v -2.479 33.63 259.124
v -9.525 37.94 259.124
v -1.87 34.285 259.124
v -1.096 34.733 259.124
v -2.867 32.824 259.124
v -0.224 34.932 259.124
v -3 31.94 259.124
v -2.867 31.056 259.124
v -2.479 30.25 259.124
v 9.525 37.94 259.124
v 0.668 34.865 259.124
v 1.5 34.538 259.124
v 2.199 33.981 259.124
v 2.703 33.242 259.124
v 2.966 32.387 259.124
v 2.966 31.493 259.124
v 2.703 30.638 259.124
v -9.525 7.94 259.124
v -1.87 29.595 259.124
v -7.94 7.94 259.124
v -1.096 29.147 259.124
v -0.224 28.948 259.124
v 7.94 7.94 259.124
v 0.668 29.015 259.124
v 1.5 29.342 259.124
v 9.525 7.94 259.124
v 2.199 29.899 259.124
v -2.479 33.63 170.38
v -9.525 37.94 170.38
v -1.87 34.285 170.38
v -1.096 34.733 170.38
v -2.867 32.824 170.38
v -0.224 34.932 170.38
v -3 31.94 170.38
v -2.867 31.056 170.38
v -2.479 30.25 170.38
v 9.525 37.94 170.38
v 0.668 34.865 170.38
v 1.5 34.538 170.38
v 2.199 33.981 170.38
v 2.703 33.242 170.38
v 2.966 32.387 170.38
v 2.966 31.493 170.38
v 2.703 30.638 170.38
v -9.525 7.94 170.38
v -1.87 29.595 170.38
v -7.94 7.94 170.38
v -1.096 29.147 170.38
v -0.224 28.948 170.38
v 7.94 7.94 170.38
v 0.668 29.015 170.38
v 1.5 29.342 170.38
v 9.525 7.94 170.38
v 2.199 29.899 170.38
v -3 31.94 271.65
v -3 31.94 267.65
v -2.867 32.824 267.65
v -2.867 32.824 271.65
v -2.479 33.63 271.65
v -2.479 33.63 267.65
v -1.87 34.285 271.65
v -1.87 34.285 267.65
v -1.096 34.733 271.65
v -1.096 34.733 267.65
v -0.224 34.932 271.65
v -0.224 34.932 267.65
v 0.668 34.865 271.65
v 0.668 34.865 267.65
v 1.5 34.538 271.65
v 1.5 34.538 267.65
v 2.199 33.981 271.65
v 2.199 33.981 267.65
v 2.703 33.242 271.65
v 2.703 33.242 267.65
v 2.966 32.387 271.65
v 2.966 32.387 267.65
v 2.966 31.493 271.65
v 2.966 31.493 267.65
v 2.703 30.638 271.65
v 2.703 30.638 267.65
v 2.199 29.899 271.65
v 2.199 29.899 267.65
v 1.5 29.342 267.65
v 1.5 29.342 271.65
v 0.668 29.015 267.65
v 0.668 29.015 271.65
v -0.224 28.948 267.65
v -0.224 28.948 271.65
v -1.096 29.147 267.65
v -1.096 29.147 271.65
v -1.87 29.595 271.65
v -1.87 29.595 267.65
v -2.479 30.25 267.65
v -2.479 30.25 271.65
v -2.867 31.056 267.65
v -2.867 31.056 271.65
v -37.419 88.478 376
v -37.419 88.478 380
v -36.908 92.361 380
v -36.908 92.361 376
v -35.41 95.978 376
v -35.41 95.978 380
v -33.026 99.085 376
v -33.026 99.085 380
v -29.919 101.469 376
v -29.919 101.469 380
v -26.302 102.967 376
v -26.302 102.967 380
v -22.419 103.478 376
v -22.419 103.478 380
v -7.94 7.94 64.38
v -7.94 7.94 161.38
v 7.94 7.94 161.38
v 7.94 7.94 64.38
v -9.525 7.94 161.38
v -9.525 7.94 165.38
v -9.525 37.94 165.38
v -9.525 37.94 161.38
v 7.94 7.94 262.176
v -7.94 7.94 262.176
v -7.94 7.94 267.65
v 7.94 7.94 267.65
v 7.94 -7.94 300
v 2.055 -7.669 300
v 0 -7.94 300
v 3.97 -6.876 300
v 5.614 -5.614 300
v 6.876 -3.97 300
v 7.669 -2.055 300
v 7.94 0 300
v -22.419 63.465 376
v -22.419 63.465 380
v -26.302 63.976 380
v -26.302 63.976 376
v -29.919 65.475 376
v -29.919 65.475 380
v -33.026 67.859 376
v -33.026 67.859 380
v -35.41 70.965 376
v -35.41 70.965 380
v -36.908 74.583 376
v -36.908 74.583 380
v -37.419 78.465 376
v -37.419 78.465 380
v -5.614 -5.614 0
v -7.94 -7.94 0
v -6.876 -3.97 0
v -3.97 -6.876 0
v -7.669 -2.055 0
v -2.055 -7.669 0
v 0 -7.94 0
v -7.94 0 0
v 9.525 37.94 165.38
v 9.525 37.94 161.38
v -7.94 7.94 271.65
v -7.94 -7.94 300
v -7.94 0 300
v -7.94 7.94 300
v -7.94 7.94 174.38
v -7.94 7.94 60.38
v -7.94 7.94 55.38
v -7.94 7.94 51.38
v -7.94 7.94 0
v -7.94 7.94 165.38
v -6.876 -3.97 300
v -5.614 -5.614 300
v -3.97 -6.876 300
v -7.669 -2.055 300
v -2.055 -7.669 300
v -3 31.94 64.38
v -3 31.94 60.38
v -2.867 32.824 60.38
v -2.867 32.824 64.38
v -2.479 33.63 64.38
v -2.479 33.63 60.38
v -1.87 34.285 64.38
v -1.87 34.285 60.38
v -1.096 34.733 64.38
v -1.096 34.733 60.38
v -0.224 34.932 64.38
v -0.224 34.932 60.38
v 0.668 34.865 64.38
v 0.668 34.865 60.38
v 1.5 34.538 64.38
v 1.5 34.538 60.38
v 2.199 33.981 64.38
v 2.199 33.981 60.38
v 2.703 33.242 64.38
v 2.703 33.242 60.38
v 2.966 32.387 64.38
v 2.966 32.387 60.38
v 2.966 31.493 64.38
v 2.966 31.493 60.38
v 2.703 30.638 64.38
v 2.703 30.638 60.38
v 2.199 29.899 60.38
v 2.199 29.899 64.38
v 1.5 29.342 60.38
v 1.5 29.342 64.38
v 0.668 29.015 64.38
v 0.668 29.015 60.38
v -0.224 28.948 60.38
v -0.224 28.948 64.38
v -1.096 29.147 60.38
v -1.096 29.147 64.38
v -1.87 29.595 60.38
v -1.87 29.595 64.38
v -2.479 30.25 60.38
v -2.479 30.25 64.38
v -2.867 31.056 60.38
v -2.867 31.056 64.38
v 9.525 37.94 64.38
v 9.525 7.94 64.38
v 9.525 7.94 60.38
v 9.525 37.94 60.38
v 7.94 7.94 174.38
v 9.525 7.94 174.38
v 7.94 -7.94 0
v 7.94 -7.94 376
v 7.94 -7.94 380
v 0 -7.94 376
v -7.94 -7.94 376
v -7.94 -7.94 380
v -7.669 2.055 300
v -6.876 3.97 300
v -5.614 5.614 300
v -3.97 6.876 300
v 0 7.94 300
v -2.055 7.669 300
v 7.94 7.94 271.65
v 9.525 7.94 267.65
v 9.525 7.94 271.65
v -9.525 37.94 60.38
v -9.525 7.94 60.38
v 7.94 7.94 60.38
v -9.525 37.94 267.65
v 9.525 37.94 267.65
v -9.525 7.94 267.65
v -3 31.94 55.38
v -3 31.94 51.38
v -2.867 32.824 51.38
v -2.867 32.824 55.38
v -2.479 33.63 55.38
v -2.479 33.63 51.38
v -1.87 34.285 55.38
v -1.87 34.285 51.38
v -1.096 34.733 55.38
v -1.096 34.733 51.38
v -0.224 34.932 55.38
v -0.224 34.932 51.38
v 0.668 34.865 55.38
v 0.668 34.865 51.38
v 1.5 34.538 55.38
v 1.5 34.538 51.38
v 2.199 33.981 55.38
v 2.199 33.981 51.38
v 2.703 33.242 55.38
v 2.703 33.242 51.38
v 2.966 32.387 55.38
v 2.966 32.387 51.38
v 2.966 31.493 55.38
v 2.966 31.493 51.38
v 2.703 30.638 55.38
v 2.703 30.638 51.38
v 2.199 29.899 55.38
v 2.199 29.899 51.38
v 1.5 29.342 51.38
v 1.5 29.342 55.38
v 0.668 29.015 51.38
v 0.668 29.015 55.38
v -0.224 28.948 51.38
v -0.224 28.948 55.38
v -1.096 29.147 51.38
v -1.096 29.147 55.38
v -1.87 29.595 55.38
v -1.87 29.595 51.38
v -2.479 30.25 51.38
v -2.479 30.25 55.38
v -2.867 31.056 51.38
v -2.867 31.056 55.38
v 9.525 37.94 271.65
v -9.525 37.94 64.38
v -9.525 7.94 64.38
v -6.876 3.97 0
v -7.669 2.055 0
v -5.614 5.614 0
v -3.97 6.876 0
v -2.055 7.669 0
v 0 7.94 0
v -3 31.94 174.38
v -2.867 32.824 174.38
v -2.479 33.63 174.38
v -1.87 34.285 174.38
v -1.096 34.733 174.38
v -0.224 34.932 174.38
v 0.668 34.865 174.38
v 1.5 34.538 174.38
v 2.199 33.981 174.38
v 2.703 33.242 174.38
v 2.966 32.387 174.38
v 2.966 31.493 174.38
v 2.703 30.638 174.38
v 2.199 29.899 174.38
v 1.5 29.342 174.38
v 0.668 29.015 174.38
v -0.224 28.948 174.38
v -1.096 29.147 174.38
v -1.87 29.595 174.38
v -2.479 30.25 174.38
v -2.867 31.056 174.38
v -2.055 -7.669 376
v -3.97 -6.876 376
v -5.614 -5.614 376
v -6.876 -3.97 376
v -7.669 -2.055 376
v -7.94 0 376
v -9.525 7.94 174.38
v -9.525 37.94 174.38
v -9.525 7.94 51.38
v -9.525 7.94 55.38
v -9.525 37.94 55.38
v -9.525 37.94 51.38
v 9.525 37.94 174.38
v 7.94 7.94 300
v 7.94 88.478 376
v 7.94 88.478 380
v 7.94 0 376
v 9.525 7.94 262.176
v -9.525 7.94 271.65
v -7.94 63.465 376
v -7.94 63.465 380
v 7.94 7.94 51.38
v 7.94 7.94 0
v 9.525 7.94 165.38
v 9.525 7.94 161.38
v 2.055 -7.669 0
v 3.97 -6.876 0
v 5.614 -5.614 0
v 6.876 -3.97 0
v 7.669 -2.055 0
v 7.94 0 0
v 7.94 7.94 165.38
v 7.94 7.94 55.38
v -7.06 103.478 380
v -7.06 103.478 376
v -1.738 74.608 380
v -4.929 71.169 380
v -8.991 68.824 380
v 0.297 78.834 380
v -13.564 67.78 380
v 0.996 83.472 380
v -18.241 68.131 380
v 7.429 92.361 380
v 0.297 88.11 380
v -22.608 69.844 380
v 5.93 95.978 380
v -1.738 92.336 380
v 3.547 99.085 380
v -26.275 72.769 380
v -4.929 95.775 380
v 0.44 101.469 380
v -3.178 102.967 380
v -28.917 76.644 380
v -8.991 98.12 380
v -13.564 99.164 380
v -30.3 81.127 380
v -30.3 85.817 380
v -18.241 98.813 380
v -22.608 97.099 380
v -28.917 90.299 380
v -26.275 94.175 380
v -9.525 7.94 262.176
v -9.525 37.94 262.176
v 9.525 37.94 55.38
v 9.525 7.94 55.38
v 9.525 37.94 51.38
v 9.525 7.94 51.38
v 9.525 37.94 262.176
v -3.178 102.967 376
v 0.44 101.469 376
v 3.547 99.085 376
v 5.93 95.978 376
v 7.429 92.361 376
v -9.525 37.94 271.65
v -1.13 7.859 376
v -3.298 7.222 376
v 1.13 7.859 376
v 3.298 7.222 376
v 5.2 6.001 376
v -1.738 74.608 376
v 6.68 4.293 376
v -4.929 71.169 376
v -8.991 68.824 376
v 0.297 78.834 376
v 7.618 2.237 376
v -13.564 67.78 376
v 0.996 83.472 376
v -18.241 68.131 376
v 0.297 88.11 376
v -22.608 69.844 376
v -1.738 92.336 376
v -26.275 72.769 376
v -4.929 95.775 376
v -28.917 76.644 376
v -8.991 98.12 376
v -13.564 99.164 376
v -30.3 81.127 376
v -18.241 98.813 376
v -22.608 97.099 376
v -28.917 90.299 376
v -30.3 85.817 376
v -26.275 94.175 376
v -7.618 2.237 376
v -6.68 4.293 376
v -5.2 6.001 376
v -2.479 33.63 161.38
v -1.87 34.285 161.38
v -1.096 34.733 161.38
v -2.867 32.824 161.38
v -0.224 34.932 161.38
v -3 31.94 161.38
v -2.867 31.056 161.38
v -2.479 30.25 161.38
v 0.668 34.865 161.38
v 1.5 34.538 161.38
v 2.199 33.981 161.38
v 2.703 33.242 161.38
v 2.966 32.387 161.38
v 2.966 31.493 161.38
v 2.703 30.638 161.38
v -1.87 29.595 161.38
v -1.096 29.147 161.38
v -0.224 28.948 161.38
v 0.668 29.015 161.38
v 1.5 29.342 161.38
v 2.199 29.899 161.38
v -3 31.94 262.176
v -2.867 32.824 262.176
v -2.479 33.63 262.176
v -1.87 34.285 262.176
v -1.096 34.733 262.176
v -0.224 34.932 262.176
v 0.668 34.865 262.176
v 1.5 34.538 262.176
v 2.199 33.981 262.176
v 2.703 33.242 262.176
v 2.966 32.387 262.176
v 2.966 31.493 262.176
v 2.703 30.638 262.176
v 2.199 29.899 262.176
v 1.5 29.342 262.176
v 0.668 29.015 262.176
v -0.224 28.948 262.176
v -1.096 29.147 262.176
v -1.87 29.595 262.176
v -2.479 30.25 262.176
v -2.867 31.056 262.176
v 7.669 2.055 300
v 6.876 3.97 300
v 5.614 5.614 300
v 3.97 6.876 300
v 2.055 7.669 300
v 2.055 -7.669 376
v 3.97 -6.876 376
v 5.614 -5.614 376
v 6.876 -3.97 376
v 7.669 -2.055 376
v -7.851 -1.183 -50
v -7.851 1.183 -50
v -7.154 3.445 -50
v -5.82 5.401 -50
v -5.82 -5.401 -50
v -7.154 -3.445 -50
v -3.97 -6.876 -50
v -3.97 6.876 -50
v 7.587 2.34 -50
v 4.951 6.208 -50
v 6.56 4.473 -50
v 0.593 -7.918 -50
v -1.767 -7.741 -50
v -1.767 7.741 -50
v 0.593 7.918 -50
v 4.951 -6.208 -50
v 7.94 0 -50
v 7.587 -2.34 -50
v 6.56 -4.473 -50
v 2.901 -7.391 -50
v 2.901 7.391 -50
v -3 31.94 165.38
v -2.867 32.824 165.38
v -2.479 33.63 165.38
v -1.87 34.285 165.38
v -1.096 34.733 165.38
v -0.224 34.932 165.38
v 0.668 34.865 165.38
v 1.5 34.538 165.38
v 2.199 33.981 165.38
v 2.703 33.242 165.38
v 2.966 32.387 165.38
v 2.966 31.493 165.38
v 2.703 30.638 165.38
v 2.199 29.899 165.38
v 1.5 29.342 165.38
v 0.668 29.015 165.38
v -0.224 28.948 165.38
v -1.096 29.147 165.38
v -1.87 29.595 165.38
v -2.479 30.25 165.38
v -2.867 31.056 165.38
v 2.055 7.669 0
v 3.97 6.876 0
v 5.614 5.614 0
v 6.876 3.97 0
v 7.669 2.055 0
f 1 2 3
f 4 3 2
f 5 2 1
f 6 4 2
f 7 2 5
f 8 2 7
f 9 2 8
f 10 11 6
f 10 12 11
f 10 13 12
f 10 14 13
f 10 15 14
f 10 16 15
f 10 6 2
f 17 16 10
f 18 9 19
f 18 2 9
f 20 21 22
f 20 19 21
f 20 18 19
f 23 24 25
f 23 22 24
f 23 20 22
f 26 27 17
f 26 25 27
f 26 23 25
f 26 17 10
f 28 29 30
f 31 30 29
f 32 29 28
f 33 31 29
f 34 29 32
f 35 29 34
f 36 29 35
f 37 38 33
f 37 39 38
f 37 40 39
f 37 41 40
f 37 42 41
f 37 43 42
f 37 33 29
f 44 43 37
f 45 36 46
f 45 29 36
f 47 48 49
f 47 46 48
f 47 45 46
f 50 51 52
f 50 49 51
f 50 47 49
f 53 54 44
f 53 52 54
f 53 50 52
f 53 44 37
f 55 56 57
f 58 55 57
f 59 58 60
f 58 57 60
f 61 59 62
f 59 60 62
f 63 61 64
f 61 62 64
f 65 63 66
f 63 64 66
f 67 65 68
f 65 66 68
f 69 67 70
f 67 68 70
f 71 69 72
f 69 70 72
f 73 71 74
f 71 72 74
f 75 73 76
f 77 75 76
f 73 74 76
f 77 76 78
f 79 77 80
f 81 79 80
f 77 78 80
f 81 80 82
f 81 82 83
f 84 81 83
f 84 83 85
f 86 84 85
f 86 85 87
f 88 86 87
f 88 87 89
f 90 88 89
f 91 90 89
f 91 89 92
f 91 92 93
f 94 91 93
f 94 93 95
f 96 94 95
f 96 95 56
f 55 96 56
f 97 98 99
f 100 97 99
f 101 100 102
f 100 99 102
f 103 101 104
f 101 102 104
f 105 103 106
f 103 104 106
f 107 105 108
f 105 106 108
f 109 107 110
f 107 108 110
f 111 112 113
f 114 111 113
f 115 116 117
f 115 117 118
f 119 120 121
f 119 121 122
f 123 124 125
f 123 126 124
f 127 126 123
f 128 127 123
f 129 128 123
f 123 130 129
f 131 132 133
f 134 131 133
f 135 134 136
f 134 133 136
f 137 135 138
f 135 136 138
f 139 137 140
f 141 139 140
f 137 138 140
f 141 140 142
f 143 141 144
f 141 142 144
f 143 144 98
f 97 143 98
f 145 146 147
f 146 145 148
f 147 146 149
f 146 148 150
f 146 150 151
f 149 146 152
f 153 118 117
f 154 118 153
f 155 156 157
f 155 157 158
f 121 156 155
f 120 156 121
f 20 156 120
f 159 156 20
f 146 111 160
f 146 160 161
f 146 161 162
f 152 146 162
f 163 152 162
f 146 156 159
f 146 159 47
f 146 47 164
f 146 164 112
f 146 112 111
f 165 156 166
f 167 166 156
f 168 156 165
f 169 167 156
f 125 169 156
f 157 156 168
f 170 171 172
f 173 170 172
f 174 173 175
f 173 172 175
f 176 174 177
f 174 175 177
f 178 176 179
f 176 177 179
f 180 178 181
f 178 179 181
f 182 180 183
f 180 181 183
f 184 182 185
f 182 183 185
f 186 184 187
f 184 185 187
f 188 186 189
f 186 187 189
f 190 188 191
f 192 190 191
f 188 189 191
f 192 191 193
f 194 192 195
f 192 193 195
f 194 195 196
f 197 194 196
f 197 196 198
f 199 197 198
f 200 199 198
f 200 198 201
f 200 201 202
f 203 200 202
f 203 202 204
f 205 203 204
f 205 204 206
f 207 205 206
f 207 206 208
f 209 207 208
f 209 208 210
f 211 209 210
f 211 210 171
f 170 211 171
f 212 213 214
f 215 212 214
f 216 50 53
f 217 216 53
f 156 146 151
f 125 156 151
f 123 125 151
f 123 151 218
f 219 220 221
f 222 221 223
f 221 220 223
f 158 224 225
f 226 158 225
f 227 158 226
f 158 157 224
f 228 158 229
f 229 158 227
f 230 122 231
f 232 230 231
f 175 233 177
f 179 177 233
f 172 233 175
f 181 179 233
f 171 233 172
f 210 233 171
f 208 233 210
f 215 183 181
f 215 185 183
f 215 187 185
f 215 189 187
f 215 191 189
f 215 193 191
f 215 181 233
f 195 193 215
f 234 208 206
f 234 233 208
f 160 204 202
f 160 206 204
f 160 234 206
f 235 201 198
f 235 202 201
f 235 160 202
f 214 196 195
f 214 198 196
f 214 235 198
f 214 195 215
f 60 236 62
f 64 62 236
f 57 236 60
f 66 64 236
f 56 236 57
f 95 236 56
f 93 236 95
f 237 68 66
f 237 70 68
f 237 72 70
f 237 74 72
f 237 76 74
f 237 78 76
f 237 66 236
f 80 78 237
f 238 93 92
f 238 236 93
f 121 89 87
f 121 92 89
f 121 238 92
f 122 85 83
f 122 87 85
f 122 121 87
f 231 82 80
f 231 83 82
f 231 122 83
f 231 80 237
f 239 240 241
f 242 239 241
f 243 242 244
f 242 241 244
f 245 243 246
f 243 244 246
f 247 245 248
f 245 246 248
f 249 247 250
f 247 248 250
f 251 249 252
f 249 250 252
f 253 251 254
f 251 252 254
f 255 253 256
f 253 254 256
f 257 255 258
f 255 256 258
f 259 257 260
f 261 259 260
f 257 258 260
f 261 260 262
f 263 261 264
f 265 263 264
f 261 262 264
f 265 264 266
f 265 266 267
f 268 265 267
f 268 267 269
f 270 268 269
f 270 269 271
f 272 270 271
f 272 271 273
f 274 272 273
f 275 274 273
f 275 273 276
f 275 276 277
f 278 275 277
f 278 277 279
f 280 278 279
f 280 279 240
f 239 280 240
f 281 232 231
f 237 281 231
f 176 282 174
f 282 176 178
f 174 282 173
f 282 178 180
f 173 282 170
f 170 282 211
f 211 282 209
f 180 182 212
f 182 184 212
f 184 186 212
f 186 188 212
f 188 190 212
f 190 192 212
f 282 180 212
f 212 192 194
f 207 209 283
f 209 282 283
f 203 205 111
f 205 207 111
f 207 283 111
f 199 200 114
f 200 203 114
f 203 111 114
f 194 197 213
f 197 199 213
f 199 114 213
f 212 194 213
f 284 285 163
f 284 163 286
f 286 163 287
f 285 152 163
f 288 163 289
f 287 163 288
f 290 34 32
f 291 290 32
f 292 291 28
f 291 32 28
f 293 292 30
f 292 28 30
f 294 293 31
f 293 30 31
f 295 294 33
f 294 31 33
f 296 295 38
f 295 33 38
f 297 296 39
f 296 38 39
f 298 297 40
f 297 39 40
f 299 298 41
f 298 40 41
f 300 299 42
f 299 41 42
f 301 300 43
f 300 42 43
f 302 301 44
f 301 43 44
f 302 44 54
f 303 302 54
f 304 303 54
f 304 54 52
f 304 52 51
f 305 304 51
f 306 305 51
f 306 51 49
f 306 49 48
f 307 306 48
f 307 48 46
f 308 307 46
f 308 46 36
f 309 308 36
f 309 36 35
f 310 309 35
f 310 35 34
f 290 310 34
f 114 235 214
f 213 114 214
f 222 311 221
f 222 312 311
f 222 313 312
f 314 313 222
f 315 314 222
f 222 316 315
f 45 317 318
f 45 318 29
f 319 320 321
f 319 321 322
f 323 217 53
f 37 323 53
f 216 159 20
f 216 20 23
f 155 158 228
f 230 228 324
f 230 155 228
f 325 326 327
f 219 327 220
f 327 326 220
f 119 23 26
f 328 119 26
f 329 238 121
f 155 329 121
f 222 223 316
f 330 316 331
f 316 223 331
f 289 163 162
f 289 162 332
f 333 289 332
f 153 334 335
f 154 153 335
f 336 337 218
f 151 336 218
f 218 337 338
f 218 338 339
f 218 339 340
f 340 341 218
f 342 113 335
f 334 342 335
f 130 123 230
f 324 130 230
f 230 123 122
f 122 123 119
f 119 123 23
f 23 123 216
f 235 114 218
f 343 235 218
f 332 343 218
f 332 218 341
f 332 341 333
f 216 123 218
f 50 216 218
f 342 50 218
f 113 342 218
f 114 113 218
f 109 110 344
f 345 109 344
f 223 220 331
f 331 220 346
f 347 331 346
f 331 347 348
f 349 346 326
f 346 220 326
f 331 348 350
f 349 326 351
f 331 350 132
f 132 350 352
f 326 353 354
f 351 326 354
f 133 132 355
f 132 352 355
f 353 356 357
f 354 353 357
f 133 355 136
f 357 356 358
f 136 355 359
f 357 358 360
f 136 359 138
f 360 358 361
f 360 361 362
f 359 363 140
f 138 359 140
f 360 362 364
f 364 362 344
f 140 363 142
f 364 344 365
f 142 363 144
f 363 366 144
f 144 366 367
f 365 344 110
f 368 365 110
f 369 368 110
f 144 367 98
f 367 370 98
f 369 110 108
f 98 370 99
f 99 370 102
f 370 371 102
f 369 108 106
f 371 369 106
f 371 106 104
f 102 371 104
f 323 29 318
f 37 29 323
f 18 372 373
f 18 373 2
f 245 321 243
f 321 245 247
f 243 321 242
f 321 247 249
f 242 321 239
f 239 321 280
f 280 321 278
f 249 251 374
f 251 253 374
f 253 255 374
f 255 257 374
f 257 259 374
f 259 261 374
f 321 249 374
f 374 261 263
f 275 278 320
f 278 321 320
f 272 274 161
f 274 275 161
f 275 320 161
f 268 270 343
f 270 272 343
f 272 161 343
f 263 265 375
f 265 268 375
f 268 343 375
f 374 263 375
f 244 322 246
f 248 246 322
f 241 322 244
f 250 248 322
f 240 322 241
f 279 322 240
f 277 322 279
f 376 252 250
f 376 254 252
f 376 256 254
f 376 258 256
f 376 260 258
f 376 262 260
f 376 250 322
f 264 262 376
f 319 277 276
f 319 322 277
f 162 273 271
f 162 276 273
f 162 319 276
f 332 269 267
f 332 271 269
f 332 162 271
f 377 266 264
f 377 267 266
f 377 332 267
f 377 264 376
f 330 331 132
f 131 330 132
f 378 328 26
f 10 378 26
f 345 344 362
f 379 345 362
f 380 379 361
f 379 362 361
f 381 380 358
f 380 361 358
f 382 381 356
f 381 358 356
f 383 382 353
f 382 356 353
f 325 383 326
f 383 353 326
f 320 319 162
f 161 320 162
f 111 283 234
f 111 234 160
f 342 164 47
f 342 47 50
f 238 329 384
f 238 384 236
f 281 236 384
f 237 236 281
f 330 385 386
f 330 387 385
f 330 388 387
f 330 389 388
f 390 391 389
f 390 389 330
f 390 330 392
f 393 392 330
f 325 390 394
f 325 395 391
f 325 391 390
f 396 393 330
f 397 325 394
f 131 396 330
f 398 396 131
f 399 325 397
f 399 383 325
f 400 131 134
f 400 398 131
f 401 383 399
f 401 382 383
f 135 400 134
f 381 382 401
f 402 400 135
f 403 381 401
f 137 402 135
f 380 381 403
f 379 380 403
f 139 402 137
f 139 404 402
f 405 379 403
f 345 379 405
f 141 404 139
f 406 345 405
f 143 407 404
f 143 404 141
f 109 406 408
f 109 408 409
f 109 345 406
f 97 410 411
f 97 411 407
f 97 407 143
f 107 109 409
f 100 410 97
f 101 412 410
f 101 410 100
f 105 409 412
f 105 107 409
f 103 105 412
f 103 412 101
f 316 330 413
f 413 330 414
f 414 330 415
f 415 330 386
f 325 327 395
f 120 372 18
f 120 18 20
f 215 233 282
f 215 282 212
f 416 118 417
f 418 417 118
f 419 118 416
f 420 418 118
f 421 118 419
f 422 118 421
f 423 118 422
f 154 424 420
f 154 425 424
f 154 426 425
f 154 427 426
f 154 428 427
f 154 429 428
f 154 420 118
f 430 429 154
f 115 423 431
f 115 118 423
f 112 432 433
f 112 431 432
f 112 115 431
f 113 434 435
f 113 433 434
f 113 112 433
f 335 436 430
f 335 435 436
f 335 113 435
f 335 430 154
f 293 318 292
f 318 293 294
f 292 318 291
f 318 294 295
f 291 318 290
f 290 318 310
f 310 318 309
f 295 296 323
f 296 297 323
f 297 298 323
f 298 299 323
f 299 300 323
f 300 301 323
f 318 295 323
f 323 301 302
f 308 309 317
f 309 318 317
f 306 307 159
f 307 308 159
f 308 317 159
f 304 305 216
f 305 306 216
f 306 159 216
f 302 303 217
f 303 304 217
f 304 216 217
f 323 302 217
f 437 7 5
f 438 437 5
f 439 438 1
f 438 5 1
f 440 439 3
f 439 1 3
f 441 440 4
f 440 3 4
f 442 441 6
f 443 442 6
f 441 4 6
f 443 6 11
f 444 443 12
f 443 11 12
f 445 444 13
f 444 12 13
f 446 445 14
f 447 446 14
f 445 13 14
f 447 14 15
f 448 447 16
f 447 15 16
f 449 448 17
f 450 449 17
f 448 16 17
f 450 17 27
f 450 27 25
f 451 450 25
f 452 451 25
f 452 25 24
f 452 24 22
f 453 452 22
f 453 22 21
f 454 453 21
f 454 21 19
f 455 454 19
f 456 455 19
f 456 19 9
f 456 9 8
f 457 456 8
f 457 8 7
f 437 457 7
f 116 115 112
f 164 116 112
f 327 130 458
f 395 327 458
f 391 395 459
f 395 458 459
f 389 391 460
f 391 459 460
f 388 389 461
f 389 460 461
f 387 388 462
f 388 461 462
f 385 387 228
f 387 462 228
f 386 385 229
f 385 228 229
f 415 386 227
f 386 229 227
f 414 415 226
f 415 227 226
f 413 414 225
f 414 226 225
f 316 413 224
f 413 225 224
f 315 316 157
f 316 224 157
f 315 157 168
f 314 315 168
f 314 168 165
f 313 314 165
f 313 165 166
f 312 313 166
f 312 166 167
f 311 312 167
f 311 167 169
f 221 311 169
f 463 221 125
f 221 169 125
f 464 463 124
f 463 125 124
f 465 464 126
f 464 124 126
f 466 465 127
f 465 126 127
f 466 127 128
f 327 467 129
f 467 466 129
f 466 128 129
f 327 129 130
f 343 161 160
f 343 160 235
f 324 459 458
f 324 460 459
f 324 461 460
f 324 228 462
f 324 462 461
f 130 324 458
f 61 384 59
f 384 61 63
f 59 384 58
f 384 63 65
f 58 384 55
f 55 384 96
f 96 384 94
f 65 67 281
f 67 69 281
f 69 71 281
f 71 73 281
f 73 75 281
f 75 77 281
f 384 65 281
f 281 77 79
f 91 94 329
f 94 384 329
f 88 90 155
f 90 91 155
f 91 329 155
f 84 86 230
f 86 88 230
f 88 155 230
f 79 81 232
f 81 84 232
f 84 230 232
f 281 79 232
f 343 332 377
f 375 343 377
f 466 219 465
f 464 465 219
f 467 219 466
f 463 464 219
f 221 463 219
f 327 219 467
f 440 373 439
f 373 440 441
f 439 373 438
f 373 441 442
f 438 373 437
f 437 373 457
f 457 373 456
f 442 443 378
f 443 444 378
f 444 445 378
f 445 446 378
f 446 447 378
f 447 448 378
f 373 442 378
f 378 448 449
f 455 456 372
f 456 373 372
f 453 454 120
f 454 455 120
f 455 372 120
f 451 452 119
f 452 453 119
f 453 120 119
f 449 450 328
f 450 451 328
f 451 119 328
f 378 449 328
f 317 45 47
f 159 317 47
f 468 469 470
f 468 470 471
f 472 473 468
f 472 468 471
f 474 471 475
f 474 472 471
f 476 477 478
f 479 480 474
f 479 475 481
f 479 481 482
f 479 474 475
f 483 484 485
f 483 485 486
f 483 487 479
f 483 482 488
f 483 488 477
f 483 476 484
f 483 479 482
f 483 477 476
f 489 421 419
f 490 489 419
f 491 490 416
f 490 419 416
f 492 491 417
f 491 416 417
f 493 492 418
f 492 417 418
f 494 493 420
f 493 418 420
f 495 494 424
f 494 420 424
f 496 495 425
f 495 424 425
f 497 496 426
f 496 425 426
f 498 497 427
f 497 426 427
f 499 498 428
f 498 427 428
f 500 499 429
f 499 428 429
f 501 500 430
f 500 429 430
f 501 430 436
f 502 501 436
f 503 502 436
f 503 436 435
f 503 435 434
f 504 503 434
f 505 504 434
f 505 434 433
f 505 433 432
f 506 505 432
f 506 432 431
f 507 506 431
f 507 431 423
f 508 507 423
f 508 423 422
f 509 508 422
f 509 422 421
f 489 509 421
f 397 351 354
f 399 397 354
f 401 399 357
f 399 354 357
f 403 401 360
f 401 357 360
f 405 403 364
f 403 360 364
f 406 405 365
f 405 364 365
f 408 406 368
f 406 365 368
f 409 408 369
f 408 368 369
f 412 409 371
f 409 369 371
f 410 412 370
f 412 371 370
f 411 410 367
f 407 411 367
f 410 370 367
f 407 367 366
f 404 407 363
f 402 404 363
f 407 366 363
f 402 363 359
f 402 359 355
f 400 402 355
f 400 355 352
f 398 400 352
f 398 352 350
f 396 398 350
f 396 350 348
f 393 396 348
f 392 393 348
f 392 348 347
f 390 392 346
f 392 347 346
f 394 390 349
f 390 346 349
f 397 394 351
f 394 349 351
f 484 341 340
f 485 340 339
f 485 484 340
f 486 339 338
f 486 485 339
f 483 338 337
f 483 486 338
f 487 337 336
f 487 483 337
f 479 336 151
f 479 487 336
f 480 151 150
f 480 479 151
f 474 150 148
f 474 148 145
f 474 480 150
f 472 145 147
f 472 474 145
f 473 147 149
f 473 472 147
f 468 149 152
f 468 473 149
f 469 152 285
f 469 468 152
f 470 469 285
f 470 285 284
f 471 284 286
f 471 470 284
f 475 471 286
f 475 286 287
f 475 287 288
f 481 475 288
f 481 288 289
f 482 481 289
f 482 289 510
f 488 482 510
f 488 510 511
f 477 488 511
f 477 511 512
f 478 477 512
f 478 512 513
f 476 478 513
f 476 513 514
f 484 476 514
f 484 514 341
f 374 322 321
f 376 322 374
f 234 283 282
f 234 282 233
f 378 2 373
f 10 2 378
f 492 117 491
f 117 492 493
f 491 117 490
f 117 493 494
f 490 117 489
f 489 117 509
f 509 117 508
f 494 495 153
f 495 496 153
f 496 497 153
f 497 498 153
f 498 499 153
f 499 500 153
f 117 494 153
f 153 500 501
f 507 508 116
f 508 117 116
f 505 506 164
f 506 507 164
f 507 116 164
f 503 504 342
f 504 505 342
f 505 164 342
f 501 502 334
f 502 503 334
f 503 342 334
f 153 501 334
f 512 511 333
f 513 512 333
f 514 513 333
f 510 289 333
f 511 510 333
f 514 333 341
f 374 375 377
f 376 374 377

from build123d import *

# Parameters (mm, degrees)
CROQUIS2_W              = 15.88
CROQUIS2_H              = 15.88
SALIENTE_EXTRUIR1_DEPTH = 300
CROQUIS3_R              = 7.94
SALIENTE_EXTRUIR2_DEPTH = 50
SALIENTE_EXTRUIR3_START = 50
CROQUIS5_R              = 7.94
SALIENTE_EXTRUIR3_DEPTH = 50
CROQUIS6_W              = 19.05
CROQUIS6_H              = 4
CROQUIS6_H_2            = 3.052323646
SALIENTE_EXTRUIR4_DEPTH = 30
CORTAR_EXTRUIR1_REACH   = 303.171
CROQUIS7_R              = 3
CROQUIS8_R              = 7.94
SALIENTE_EXTRUIR5_DEPTH = 30
CROQUIS9_R              = 15.735705631
SALIENTE_EXTRUIR6_DEPTH = 4


with BuildPart() as part:
    # Croquis2 → Saliente-Extruir1 (new body)
    with BuildSketch(Plane.XY):
        Rectangle(CROQUIS2_W, CROQUIS2_H)
    extrude(amount=SALIENTE_EXTRUIR1_DEPTH)

    # Croquis3 → Saliente-Extruir2 (add)
    with BuildSketch(Plane.XY.offset(300)):
        Circle(CROQUIS3_R)
    extrude(amount=SALIENTE_EXTRUIR2_DEPTH)

    # Croquis5 → Saliente-Extruir3 (add)
    with BuildSketch(Plane(origin=(0, 0, 0), x_dir=(-1, 0, 0), z_dir=(0, 0, -1)).offset(SALIENTE_EXTRUIR3_START)):
        with Locations(Location((0, 0, 0), (0, 0, 180))):
            Circle(CROQUIS5_R)
    extrude(amount=-SALIENTE_EXTRUIR3_DEPTH)

    # Croquis6 → Saliente-Extruir4 (add)
    with BuildSketch(Plane(origin=(0, 7.94, 0), x_dir=(1, 0, 0), z_dir=(0, 1, 0))):
        with Locations((0, -269.65)):
            Rectangle(CROQUIS6_W, CROQUIS6_H)
        with Locations((0, -260.65)):
            Rectangle(CROQUIS6_W, CROQUIS6_H_2)
        with Locations((0, -172.38)):
            Rectangle(CROQUIS6_W, CROQUIS6_H)
        with Locations((0, -163.38)):
            Rectangle(CROQUIS6_W, CROQUIS6_H)
        with Locations((0, -62.38)):
            Rectangle(CROQUIS6_W, CROQUIS6_H)
        with Locations((0, -53.38)):
            Rectangle(CROQUIS6_W, CROQUIS6_H)
    extrude(amount=SALIENTE_EXTRUIR4_DEPTH)

    # Cortar-Extruir1: up to this face of the body (flat: up to its plane)
    cortar_extruir1_end = Plane(part.part.faces().sort_by_distance((0, 22.94, 271.65))[0])
    # Croquis7 → Cortar-Extruir1 (cut, up to the picked face)
    with BuildSketch(Plane(origin=(0, 0, 51.38), x_dir=(-1, 0, 0), z_dir=(0, 0, -1)), mode=Mode.PRIVATE) as cortar_extruir1_sk1:
        with Locations((0, 31.94)):
            Circle(CROQUIS7_R)
    cortar_extruir1_tool1 = split(extrude(cortar_extruir1_sk1.sketch, amount=-CORTAR_EXTRUIR1_REACH, mode=Mode.PRIVATE), bisect_by=cortar_extruir1_end, keep=Keep.BOTH, mode=Mode.PRIVATE)
    add(cortar_extruir1_tool1.solids().sort_by(Axis((0, 31.94, 51.38), (0, 0, 1)))[0], mode=Mode.SUBTRACT)

    # Croquis8 → Saliente-Extruir5 (add)
    with BuildSketch(Plane.XY.offset(350)):
        Circle(CROQUIS8_R)
    extrude(amount=SALIENTE_EXTRUIR5_DEPTH)

    # Croquis9 → Saliente-Extruir6 (add)
    with BuildSketch(Plane.XY.offset(380)):
        with BuildLine():
            Line((-7.94, 7.94), (-7.94, 27.049213062))
            Line((-7.94, 27.049213062), (-7.94, 63.465360978))
            Line((-7.94, 63.465360978), (-22.419294846, 63.465360978))
            ThreePointArc((-22.419294846, 63.465360978), (-33.025896564, 67.85875926), (-37.419294846, 78.465360978))
            Line((-37.419294846, 78.465360978), (-37.419294846, 88.478483412))
            ThreePointArc((-37.419294846, 88.478483412), (-33.025896564, 99.085085129), (-22.419294846, 103.478483412))
            Line((-22.419294846, 103.478483412), (-7.06, 103.478483412))
            ThreePointArc((-7.06, 103.478483412), (3.546601718, 99.085085129), (7.94, 88.478483412))
            Line((7.94, 88.478483412), (7.94, 63.465360978))
            Line((7.94, 63.465360978), (7.94, 7.94))
            Line((7.94, 7.94), (7.94, -7.94))
            Line((7.94, -7.94), (-7.94, -7.94))
            Line((-7.94, -7.94), (-7.94, 7.94))
        make_face()
        with Locations((-14.739647423, 83.471922195)):
            Circle(CROQUIS9_R, mode=Mode.SUBTRACT)
    extrude(amount=-SALIENTE_EXTRUIR6_DEPTH)


solid = part.part
